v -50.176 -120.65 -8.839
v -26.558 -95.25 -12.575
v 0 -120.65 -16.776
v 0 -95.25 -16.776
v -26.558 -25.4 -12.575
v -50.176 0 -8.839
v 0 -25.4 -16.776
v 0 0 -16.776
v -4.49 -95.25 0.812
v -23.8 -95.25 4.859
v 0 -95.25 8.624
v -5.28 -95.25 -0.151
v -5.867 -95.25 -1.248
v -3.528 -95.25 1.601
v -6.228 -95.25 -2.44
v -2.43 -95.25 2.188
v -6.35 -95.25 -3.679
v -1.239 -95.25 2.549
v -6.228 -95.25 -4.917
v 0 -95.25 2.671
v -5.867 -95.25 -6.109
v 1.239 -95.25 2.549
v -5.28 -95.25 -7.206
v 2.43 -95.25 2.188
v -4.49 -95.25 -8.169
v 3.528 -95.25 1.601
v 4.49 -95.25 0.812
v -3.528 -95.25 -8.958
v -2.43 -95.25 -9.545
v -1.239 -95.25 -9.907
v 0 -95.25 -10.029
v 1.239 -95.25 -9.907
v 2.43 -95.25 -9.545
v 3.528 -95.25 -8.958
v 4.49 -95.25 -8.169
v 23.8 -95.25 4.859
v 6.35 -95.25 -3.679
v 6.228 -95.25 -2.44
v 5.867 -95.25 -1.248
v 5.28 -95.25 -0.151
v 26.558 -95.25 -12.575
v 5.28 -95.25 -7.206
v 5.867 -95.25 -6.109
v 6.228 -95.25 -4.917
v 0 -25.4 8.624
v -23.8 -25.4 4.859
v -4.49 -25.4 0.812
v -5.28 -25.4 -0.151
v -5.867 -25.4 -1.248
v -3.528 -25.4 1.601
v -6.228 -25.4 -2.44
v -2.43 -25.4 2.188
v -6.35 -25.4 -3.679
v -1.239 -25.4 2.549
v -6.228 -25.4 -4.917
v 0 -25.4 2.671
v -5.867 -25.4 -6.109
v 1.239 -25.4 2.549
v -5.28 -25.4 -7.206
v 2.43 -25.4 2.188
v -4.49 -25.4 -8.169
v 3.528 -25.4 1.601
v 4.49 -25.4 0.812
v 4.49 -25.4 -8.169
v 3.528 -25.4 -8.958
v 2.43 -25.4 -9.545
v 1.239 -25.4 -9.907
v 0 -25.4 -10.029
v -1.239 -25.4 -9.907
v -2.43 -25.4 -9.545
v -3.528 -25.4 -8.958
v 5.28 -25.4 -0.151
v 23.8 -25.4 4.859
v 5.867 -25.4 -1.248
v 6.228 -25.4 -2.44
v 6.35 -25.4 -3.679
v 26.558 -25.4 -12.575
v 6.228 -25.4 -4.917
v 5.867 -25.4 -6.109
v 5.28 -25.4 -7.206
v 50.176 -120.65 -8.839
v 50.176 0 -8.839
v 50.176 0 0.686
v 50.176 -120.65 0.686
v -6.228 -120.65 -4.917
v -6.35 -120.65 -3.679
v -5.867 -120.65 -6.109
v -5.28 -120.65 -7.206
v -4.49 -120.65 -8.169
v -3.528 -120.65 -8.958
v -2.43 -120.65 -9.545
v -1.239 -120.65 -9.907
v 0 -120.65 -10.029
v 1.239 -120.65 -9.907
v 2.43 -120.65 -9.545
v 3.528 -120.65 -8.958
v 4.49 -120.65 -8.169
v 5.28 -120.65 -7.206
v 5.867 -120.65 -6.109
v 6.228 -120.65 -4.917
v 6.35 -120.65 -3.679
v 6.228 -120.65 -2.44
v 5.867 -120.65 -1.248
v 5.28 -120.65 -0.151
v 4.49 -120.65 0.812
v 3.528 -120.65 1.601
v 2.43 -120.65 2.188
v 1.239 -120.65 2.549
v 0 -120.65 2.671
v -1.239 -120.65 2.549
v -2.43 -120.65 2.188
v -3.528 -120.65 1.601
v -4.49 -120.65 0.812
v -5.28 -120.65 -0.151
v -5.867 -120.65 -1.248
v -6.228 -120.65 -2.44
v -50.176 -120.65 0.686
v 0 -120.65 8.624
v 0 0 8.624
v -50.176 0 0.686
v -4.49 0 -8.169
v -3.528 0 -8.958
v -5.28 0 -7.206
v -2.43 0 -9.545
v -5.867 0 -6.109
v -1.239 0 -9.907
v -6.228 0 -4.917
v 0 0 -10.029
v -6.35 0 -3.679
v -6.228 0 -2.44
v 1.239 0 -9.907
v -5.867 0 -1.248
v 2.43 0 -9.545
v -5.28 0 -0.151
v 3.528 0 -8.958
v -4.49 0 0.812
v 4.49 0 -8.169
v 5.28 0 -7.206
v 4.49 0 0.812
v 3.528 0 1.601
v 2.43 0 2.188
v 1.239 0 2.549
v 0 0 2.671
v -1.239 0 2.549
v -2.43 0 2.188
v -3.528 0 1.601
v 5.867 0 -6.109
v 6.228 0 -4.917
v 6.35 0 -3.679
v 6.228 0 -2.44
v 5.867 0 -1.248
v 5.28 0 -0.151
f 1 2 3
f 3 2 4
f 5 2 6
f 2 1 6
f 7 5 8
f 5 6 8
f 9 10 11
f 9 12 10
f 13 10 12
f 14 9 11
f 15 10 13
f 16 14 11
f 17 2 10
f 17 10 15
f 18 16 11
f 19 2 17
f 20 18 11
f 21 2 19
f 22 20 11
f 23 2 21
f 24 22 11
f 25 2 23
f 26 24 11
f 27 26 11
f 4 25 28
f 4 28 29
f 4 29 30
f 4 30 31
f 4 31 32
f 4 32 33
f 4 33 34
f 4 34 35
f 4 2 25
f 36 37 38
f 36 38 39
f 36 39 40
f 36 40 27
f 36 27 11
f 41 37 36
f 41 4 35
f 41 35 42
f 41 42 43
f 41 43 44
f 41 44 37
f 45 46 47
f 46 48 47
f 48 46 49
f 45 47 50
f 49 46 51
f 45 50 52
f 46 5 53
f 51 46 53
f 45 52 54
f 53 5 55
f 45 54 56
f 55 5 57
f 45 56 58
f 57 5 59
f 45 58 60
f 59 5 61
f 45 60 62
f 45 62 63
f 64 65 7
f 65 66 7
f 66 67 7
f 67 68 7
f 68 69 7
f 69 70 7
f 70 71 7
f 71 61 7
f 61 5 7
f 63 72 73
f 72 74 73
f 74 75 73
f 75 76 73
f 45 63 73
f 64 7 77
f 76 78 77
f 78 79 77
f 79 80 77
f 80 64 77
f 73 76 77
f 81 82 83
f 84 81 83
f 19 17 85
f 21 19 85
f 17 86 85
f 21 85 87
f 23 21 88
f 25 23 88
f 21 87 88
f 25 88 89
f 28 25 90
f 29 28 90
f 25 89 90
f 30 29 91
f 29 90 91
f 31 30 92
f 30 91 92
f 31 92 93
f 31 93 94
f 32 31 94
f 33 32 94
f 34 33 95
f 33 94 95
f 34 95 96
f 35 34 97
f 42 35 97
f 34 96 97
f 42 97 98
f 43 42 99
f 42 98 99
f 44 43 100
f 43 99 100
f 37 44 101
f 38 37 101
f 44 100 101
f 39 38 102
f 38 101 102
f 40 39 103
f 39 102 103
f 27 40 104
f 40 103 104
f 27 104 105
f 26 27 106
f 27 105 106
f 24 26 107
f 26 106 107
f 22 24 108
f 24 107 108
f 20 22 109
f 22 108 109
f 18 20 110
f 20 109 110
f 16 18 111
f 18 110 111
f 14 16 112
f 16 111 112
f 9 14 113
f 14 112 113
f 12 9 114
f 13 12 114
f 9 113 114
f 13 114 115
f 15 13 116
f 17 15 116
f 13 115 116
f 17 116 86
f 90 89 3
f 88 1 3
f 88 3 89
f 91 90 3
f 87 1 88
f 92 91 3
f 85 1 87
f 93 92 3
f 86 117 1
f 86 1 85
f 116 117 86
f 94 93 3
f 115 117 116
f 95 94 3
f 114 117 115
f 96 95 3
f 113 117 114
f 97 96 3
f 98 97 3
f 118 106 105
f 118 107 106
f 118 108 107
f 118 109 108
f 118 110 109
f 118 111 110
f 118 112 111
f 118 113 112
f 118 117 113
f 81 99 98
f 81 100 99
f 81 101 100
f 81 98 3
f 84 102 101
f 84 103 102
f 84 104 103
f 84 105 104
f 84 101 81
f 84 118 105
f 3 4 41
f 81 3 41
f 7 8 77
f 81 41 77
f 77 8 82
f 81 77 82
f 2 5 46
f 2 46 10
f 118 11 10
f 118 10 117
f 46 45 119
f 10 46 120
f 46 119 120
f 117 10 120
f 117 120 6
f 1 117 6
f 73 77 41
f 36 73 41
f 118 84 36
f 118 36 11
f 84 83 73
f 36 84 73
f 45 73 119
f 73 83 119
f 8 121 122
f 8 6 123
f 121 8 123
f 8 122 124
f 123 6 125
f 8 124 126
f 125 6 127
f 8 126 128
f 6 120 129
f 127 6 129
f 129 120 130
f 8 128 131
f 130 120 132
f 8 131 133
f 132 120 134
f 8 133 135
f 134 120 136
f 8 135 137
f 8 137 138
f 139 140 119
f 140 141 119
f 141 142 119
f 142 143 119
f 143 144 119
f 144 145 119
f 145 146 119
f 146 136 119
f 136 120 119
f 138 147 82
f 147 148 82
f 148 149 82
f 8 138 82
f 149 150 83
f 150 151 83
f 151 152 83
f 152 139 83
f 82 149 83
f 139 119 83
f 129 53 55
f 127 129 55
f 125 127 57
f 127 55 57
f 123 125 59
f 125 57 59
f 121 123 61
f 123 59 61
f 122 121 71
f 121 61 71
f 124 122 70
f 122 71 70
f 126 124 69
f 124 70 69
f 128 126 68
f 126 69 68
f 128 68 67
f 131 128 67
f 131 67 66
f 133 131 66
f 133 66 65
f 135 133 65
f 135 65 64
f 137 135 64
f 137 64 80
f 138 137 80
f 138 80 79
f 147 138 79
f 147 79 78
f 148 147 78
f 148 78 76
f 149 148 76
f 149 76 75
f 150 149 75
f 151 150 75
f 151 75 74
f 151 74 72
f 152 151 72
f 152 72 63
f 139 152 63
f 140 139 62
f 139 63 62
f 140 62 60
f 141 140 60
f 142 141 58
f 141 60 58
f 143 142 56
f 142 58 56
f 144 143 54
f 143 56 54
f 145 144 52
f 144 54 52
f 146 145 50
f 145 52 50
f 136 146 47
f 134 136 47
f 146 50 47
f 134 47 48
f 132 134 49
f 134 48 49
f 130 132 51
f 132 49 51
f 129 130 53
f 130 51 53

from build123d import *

# Parameters (mm, degrees)
F1_DEPTH = 120.65
F2_DEPTH = 120.65
F4_D     = 12.7
F6_W     = 26.88828125
F6_H     = 69.85
F7_DEPTH = 32.9290334674
F5_W     = 26.88828125
F5_H     = 69.85
F8_DEPTH = 32.9290334674


with BuildPart() as f1:
    # F0 (on Front) → F1 (new body)
    with BuildSketch(Plane.XZ):
        Polygon((-50.176050998, 0.6862330108), (-50.176050998, -8.8387669892), (0, -16.7762669892), (0, 8.6237330108), align=None)
    extrude(amount=F1_DEPTH)

    # F0 (on Front) → F2 (join)
    with BuildSketch(Plane.XZ):
        Polygon((0, 8.6237330108), (0, -16.7762669892), (50.176050998, -8.8387669892), (50.176050998, 0.6862330108), align=None)
    extrude(amount=F2_DEPTH)

    # F4 (through all)
    with Locations(Plane(origin=(0, 0, 0), x_dir=(1, 0, 0), z_dir=(0, 1, 0))):
        with Locations((0, 3.6785302916)):
            Hole(F4_D / 2)

    # F6 (on face) → F7 (cut, through all)
    with BuildSketch(Plane(origin=(-2.5890958046, 0, -16.3666901584), x_dir=(0.9877175393, 0, -0.15625), z_dir=(-0.15625, 0, -0.9877175393))):
        with Locations((-10.8228489079, 60.325)):
            Rectangle(F6_W, F6_H)
    extrude(amount=-F7_DEPTH, mode=Mode.SUBTRACT)

    # F5 (on face) → F8 (cut, through all)
    with BuildSketch(Plane(origin=(2.5890958046, 0, -16.3666901584), x_dir=(0.9877175393, 0, 0.15625), z_dir=(0.15625, 0, -0.9877175393))):
        with Locations((10.8228489079, 60.325)):
            Rectangle(F5_W, F5_H)
    extrude(amount=-F8_DEPTH, mode=Mode.SUBTRACT)


solid = f1.part
